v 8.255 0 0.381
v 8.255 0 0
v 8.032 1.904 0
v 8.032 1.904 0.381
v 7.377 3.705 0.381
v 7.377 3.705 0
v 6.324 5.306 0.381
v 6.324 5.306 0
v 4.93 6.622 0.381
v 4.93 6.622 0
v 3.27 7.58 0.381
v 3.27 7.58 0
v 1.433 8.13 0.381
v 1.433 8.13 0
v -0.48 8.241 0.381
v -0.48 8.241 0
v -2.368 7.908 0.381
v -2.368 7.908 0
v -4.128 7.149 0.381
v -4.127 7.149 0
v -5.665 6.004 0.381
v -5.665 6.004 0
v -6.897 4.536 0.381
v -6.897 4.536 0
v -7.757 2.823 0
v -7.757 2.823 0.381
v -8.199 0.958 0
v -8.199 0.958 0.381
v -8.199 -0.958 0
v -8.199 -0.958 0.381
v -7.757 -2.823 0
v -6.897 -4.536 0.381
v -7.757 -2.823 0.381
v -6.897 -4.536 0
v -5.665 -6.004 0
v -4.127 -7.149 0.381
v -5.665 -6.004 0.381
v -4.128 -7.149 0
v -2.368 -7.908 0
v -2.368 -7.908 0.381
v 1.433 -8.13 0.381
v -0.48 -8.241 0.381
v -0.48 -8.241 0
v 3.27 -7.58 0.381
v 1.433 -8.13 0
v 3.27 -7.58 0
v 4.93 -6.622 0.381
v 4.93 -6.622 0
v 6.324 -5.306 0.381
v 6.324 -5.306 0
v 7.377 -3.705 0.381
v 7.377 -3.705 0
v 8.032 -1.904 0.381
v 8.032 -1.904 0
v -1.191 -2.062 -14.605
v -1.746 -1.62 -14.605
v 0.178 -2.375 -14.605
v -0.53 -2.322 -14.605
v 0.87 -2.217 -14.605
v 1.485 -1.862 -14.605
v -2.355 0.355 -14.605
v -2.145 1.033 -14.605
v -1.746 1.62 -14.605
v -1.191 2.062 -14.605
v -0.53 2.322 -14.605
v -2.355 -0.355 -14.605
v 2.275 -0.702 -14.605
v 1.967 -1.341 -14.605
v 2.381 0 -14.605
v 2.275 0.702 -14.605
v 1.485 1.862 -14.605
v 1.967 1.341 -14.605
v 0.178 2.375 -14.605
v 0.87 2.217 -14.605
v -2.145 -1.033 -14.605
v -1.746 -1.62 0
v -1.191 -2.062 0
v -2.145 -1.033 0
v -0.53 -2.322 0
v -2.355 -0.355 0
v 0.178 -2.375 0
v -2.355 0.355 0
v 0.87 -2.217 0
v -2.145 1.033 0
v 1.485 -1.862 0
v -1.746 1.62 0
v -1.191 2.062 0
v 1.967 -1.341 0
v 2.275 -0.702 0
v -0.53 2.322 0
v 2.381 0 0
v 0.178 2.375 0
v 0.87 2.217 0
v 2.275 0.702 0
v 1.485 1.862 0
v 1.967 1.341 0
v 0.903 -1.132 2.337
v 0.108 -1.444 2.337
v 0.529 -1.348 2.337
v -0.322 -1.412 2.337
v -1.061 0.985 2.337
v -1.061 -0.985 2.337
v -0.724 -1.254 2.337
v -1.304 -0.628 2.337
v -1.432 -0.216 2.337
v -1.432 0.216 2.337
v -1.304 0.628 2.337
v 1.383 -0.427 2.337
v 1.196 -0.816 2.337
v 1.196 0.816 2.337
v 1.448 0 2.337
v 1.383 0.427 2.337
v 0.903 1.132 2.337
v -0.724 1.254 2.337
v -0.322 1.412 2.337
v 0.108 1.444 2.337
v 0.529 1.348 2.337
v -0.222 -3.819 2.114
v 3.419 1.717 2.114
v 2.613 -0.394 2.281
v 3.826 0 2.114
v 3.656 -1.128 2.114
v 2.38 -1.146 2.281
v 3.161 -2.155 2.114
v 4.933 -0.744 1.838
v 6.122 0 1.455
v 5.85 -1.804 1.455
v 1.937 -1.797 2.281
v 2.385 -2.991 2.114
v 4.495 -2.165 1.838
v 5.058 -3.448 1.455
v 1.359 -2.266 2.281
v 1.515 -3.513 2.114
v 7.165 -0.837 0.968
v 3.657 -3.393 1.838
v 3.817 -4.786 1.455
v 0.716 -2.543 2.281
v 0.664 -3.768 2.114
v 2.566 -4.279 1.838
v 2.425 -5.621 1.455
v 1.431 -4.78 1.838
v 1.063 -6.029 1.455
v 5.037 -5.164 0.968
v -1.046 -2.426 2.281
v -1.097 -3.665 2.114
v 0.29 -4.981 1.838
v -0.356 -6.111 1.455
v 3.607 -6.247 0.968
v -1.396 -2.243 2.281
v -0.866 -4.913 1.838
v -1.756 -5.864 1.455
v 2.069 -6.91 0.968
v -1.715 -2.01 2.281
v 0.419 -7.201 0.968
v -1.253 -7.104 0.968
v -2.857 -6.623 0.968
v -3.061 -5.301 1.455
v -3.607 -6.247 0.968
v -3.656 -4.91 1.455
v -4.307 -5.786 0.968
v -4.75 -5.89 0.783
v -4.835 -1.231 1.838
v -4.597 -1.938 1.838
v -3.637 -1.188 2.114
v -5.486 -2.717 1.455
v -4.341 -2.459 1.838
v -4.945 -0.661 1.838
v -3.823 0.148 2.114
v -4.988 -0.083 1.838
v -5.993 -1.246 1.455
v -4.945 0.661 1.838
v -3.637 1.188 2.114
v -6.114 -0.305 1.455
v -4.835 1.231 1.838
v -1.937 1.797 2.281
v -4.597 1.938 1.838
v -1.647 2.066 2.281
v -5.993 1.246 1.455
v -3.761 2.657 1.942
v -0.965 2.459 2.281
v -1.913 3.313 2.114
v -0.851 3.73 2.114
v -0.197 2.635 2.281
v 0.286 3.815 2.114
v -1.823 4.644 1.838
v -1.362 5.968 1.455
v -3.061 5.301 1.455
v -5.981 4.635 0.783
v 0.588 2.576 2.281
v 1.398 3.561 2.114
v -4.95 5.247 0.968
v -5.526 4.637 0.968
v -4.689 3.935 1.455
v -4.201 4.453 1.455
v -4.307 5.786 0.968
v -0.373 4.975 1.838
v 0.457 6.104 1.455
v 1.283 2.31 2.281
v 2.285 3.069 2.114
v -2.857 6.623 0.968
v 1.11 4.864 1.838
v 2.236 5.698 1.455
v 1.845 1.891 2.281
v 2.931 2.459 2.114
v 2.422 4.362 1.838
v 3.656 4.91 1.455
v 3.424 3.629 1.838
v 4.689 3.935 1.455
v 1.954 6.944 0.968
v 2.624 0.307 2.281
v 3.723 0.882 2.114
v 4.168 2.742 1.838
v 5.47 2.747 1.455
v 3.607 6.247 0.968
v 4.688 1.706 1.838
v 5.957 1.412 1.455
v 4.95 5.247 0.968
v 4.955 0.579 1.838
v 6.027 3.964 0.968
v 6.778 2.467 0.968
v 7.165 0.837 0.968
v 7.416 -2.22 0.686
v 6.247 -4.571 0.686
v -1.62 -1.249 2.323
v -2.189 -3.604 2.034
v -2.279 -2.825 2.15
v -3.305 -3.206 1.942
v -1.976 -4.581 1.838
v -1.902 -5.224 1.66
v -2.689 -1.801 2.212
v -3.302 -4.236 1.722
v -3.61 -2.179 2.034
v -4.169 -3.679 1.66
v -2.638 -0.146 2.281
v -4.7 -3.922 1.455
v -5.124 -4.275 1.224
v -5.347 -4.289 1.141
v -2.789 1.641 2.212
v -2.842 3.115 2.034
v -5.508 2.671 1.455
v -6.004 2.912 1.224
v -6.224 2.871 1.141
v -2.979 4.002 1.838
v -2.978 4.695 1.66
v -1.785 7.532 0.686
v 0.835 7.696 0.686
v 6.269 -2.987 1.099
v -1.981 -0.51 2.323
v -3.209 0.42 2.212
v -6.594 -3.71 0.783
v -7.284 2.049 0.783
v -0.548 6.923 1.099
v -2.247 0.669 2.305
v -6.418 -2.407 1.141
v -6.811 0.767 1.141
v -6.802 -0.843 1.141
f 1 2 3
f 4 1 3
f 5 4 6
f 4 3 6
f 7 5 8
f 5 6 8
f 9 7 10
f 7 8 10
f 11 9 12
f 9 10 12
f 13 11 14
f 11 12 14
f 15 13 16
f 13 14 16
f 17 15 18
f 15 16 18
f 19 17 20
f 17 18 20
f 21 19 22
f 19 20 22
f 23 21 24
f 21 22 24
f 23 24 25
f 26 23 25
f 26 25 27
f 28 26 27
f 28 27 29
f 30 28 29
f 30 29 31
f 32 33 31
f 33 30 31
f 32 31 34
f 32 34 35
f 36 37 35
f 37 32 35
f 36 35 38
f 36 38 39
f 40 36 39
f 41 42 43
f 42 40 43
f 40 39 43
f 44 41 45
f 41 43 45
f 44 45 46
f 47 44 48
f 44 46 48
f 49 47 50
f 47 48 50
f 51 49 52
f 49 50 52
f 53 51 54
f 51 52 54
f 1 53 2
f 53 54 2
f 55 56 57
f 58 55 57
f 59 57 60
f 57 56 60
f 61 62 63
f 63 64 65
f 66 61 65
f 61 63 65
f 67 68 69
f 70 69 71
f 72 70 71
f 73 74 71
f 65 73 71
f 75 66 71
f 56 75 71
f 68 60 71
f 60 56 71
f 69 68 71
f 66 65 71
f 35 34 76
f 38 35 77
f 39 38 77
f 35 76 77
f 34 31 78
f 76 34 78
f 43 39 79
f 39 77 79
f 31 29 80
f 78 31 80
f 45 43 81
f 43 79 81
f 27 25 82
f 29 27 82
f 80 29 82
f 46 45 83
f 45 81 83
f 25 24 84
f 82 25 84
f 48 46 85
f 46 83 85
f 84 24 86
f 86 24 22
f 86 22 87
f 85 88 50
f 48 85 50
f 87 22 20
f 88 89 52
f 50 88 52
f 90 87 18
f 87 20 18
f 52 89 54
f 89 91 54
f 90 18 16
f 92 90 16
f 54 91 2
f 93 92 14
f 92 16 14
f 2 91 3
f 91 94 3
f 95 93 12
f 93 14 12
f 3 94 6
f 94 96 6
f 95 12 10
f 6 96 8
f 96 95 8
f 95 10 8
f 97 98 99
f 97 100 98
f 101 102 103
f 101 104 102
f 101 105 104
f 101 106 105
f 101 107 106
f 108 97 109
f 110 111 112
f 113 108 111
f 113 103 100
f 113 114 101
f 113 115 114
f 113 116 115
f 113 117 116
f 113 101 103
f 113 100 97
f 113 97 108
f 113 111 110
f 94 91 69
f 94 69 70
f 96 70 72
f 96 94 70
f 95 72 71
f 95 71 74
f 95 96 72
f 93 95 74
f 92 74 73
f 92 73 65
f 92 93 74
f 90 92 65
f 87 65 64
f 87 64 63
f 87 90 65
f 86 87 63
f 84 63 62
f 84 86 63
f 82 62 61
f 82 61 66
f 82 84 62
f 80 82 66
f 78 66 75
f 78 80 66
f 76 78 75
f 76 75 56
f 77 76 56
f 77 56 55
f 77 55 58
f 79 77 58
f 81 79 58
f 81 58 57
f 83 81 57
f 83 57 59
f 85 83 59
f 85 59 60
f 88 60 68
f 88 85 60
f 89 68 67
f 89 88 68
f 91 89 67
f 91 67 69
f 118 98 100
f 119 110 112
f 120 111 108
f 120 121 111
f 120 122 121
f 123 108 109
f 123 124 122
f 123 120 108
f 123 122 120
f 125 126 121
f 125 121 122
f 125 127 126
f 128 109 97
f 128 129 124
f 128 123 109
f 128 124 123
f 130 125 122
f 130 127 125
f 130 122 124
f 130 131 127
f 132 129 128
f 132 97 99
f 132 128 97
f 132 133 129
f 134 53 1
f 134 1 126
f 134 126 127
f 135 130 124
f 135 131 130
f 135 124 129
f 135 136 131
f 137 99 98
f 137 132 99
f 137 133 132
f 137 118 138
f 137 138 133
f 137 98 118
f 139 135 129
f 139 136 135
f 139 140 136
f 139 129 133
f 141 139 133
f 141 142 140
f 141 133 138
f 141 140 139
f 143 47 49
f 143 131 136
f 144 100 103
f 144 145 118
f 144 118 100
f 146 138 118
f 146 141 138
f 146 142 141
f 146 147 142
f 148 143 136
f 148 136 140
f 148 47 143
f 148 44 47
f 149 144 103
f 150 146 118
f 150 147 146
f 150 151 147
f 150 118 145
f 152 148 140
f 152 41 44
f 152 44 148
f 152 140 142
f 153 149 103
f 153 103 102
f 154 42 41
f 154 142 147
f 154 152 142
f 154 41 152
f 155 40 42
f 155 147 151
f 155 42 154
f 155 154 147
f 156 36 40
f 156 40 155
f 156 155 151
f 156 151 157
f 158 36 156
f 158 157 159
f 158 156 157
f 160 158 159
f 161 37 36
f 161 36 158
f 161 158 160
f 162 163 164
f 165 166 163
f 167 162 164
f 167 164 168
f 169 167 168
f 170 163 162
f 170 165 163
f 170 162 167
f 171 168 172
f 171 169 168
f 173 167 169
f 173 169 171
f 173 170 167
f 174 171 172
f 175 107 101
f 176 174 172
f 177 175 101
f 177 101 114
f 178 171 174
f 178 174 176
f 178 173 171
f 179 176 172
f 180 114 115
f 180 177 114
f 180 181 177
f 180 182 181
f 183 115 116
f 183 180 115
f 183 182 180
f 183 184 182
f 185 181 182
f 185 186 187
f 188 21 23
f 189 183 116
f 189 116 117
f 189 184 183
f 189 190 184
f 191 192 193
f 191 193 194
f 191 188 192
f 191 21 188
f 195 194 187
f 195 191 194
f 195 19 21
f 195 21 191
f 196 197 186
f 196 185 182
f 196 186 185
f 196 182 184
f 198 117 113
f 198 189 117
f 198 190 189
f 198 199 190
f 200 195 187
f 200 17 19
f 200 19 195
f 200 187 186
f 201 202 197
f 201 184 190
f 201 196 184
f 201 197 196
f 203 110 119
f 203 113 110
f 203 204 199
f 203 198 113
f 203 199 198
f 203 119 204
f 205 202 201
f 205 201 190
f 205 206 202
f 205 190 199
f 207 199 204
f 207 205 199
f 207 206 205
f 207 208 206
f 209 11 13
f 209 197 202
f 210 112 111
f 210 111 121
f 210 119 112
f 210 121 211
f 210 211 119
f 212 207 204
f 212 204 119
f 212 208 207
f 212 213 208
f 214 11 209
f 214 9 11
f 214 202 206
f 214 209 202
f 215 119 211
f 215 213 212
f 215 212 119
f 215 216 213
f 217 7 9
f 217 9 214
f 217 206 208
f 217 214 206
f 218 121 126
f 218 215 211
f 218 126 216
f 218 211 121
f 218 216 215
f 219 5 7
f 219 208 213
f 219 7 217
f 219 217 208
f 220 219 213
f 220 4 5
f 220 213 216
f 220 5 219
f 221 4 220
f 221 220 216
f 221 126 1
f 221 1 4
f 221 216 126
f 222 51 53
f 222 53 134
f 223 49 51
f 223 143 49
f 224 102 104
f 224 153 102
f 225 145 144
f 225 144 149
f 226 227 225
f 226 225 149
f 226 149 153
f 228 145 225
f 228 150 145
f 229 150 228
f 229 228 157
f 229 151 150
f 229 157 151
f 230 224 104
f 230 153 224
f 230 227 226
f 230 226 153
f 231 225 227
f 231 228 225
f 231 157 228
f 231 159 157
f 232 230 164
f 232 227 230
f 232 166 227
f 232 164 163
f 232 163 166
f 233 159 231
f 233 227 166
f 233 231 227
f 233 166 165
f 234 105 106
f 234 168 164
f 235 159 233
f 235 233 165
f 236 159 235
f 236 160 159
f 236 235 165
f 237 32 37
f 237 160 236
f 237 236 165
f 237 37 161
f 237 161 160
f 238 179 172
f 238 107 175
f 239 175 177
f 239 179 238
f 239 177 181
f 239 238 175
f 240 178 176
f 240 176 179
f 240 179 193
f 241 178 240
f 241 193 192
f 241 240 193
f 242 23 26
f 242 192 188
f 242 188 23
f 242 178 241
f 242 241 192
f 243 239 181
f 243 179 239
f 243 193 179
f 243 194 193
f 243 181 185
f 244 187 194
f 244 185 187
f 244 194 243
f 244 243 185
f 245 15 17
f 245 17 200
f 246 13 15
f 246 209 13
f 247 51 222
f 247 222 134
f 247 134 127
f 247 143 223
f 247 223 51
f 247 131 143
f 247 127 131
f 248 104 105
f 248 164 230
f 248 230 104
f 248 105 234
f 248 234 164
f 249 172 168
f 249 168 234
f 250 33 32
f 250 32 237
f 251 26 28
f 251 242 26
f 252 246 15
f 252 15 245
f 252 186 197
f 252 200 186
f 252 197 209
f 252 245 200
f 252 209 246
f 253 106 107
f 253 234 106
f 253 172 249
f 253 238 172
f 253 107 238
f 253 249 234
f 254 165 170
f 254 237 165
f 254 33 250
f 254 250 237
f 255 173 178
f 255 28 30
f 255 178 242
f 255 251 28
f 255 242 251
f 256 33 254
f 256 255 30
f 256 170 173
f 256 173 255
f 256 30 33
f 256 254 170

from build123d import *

# Parameters (mm, degrees)
SKETCH1_R           = 8.255
BOSS_EXTRUDE1_DEPTH = 2.3368
SKETCH2_R           = 2.38125
BOSS_EXTRUDE2_DEPTH = 14.605


with BuildPart() as part:
    # Sketch1 → Boss-Extrude1 (new body)
    with BuildSketch(Plane.XY):
        Circle(SKETCH1_R)
    extrude(amount=BOSS_EXTRUDE1_DEPTH)

    # Sketch2 → Boss-Extrude2 (add)
    with BuildSketch(Plane.XY):
        Circle(SKETCH2_R)
    extrude(amount=-BOSS_EXTRUDE2_DEPTH)

    # Sketch3 → Cut-Revolve1 (revolve, cut)
    with BuildSketch(Plane(origin=(0, 0, 0), x_dir=(1, 0, 0), z_dir=(0, 1, 0))):
        with BuildLine():
            ThreePointArc((1.4478, -2.3368), (4.989096566, -1.838155581), (8.255, -0.381))
            Line((8.255, -0.381), (8.255, -2.3368))
            Line((8.255, -2.3368), (1.4478, -2.3368))
        make_face()
    revolve(axis=Axis((0, 0, 2.3368), (0, 0, -1)), mode=Mode.SUBTRACT)


solid = part.part
